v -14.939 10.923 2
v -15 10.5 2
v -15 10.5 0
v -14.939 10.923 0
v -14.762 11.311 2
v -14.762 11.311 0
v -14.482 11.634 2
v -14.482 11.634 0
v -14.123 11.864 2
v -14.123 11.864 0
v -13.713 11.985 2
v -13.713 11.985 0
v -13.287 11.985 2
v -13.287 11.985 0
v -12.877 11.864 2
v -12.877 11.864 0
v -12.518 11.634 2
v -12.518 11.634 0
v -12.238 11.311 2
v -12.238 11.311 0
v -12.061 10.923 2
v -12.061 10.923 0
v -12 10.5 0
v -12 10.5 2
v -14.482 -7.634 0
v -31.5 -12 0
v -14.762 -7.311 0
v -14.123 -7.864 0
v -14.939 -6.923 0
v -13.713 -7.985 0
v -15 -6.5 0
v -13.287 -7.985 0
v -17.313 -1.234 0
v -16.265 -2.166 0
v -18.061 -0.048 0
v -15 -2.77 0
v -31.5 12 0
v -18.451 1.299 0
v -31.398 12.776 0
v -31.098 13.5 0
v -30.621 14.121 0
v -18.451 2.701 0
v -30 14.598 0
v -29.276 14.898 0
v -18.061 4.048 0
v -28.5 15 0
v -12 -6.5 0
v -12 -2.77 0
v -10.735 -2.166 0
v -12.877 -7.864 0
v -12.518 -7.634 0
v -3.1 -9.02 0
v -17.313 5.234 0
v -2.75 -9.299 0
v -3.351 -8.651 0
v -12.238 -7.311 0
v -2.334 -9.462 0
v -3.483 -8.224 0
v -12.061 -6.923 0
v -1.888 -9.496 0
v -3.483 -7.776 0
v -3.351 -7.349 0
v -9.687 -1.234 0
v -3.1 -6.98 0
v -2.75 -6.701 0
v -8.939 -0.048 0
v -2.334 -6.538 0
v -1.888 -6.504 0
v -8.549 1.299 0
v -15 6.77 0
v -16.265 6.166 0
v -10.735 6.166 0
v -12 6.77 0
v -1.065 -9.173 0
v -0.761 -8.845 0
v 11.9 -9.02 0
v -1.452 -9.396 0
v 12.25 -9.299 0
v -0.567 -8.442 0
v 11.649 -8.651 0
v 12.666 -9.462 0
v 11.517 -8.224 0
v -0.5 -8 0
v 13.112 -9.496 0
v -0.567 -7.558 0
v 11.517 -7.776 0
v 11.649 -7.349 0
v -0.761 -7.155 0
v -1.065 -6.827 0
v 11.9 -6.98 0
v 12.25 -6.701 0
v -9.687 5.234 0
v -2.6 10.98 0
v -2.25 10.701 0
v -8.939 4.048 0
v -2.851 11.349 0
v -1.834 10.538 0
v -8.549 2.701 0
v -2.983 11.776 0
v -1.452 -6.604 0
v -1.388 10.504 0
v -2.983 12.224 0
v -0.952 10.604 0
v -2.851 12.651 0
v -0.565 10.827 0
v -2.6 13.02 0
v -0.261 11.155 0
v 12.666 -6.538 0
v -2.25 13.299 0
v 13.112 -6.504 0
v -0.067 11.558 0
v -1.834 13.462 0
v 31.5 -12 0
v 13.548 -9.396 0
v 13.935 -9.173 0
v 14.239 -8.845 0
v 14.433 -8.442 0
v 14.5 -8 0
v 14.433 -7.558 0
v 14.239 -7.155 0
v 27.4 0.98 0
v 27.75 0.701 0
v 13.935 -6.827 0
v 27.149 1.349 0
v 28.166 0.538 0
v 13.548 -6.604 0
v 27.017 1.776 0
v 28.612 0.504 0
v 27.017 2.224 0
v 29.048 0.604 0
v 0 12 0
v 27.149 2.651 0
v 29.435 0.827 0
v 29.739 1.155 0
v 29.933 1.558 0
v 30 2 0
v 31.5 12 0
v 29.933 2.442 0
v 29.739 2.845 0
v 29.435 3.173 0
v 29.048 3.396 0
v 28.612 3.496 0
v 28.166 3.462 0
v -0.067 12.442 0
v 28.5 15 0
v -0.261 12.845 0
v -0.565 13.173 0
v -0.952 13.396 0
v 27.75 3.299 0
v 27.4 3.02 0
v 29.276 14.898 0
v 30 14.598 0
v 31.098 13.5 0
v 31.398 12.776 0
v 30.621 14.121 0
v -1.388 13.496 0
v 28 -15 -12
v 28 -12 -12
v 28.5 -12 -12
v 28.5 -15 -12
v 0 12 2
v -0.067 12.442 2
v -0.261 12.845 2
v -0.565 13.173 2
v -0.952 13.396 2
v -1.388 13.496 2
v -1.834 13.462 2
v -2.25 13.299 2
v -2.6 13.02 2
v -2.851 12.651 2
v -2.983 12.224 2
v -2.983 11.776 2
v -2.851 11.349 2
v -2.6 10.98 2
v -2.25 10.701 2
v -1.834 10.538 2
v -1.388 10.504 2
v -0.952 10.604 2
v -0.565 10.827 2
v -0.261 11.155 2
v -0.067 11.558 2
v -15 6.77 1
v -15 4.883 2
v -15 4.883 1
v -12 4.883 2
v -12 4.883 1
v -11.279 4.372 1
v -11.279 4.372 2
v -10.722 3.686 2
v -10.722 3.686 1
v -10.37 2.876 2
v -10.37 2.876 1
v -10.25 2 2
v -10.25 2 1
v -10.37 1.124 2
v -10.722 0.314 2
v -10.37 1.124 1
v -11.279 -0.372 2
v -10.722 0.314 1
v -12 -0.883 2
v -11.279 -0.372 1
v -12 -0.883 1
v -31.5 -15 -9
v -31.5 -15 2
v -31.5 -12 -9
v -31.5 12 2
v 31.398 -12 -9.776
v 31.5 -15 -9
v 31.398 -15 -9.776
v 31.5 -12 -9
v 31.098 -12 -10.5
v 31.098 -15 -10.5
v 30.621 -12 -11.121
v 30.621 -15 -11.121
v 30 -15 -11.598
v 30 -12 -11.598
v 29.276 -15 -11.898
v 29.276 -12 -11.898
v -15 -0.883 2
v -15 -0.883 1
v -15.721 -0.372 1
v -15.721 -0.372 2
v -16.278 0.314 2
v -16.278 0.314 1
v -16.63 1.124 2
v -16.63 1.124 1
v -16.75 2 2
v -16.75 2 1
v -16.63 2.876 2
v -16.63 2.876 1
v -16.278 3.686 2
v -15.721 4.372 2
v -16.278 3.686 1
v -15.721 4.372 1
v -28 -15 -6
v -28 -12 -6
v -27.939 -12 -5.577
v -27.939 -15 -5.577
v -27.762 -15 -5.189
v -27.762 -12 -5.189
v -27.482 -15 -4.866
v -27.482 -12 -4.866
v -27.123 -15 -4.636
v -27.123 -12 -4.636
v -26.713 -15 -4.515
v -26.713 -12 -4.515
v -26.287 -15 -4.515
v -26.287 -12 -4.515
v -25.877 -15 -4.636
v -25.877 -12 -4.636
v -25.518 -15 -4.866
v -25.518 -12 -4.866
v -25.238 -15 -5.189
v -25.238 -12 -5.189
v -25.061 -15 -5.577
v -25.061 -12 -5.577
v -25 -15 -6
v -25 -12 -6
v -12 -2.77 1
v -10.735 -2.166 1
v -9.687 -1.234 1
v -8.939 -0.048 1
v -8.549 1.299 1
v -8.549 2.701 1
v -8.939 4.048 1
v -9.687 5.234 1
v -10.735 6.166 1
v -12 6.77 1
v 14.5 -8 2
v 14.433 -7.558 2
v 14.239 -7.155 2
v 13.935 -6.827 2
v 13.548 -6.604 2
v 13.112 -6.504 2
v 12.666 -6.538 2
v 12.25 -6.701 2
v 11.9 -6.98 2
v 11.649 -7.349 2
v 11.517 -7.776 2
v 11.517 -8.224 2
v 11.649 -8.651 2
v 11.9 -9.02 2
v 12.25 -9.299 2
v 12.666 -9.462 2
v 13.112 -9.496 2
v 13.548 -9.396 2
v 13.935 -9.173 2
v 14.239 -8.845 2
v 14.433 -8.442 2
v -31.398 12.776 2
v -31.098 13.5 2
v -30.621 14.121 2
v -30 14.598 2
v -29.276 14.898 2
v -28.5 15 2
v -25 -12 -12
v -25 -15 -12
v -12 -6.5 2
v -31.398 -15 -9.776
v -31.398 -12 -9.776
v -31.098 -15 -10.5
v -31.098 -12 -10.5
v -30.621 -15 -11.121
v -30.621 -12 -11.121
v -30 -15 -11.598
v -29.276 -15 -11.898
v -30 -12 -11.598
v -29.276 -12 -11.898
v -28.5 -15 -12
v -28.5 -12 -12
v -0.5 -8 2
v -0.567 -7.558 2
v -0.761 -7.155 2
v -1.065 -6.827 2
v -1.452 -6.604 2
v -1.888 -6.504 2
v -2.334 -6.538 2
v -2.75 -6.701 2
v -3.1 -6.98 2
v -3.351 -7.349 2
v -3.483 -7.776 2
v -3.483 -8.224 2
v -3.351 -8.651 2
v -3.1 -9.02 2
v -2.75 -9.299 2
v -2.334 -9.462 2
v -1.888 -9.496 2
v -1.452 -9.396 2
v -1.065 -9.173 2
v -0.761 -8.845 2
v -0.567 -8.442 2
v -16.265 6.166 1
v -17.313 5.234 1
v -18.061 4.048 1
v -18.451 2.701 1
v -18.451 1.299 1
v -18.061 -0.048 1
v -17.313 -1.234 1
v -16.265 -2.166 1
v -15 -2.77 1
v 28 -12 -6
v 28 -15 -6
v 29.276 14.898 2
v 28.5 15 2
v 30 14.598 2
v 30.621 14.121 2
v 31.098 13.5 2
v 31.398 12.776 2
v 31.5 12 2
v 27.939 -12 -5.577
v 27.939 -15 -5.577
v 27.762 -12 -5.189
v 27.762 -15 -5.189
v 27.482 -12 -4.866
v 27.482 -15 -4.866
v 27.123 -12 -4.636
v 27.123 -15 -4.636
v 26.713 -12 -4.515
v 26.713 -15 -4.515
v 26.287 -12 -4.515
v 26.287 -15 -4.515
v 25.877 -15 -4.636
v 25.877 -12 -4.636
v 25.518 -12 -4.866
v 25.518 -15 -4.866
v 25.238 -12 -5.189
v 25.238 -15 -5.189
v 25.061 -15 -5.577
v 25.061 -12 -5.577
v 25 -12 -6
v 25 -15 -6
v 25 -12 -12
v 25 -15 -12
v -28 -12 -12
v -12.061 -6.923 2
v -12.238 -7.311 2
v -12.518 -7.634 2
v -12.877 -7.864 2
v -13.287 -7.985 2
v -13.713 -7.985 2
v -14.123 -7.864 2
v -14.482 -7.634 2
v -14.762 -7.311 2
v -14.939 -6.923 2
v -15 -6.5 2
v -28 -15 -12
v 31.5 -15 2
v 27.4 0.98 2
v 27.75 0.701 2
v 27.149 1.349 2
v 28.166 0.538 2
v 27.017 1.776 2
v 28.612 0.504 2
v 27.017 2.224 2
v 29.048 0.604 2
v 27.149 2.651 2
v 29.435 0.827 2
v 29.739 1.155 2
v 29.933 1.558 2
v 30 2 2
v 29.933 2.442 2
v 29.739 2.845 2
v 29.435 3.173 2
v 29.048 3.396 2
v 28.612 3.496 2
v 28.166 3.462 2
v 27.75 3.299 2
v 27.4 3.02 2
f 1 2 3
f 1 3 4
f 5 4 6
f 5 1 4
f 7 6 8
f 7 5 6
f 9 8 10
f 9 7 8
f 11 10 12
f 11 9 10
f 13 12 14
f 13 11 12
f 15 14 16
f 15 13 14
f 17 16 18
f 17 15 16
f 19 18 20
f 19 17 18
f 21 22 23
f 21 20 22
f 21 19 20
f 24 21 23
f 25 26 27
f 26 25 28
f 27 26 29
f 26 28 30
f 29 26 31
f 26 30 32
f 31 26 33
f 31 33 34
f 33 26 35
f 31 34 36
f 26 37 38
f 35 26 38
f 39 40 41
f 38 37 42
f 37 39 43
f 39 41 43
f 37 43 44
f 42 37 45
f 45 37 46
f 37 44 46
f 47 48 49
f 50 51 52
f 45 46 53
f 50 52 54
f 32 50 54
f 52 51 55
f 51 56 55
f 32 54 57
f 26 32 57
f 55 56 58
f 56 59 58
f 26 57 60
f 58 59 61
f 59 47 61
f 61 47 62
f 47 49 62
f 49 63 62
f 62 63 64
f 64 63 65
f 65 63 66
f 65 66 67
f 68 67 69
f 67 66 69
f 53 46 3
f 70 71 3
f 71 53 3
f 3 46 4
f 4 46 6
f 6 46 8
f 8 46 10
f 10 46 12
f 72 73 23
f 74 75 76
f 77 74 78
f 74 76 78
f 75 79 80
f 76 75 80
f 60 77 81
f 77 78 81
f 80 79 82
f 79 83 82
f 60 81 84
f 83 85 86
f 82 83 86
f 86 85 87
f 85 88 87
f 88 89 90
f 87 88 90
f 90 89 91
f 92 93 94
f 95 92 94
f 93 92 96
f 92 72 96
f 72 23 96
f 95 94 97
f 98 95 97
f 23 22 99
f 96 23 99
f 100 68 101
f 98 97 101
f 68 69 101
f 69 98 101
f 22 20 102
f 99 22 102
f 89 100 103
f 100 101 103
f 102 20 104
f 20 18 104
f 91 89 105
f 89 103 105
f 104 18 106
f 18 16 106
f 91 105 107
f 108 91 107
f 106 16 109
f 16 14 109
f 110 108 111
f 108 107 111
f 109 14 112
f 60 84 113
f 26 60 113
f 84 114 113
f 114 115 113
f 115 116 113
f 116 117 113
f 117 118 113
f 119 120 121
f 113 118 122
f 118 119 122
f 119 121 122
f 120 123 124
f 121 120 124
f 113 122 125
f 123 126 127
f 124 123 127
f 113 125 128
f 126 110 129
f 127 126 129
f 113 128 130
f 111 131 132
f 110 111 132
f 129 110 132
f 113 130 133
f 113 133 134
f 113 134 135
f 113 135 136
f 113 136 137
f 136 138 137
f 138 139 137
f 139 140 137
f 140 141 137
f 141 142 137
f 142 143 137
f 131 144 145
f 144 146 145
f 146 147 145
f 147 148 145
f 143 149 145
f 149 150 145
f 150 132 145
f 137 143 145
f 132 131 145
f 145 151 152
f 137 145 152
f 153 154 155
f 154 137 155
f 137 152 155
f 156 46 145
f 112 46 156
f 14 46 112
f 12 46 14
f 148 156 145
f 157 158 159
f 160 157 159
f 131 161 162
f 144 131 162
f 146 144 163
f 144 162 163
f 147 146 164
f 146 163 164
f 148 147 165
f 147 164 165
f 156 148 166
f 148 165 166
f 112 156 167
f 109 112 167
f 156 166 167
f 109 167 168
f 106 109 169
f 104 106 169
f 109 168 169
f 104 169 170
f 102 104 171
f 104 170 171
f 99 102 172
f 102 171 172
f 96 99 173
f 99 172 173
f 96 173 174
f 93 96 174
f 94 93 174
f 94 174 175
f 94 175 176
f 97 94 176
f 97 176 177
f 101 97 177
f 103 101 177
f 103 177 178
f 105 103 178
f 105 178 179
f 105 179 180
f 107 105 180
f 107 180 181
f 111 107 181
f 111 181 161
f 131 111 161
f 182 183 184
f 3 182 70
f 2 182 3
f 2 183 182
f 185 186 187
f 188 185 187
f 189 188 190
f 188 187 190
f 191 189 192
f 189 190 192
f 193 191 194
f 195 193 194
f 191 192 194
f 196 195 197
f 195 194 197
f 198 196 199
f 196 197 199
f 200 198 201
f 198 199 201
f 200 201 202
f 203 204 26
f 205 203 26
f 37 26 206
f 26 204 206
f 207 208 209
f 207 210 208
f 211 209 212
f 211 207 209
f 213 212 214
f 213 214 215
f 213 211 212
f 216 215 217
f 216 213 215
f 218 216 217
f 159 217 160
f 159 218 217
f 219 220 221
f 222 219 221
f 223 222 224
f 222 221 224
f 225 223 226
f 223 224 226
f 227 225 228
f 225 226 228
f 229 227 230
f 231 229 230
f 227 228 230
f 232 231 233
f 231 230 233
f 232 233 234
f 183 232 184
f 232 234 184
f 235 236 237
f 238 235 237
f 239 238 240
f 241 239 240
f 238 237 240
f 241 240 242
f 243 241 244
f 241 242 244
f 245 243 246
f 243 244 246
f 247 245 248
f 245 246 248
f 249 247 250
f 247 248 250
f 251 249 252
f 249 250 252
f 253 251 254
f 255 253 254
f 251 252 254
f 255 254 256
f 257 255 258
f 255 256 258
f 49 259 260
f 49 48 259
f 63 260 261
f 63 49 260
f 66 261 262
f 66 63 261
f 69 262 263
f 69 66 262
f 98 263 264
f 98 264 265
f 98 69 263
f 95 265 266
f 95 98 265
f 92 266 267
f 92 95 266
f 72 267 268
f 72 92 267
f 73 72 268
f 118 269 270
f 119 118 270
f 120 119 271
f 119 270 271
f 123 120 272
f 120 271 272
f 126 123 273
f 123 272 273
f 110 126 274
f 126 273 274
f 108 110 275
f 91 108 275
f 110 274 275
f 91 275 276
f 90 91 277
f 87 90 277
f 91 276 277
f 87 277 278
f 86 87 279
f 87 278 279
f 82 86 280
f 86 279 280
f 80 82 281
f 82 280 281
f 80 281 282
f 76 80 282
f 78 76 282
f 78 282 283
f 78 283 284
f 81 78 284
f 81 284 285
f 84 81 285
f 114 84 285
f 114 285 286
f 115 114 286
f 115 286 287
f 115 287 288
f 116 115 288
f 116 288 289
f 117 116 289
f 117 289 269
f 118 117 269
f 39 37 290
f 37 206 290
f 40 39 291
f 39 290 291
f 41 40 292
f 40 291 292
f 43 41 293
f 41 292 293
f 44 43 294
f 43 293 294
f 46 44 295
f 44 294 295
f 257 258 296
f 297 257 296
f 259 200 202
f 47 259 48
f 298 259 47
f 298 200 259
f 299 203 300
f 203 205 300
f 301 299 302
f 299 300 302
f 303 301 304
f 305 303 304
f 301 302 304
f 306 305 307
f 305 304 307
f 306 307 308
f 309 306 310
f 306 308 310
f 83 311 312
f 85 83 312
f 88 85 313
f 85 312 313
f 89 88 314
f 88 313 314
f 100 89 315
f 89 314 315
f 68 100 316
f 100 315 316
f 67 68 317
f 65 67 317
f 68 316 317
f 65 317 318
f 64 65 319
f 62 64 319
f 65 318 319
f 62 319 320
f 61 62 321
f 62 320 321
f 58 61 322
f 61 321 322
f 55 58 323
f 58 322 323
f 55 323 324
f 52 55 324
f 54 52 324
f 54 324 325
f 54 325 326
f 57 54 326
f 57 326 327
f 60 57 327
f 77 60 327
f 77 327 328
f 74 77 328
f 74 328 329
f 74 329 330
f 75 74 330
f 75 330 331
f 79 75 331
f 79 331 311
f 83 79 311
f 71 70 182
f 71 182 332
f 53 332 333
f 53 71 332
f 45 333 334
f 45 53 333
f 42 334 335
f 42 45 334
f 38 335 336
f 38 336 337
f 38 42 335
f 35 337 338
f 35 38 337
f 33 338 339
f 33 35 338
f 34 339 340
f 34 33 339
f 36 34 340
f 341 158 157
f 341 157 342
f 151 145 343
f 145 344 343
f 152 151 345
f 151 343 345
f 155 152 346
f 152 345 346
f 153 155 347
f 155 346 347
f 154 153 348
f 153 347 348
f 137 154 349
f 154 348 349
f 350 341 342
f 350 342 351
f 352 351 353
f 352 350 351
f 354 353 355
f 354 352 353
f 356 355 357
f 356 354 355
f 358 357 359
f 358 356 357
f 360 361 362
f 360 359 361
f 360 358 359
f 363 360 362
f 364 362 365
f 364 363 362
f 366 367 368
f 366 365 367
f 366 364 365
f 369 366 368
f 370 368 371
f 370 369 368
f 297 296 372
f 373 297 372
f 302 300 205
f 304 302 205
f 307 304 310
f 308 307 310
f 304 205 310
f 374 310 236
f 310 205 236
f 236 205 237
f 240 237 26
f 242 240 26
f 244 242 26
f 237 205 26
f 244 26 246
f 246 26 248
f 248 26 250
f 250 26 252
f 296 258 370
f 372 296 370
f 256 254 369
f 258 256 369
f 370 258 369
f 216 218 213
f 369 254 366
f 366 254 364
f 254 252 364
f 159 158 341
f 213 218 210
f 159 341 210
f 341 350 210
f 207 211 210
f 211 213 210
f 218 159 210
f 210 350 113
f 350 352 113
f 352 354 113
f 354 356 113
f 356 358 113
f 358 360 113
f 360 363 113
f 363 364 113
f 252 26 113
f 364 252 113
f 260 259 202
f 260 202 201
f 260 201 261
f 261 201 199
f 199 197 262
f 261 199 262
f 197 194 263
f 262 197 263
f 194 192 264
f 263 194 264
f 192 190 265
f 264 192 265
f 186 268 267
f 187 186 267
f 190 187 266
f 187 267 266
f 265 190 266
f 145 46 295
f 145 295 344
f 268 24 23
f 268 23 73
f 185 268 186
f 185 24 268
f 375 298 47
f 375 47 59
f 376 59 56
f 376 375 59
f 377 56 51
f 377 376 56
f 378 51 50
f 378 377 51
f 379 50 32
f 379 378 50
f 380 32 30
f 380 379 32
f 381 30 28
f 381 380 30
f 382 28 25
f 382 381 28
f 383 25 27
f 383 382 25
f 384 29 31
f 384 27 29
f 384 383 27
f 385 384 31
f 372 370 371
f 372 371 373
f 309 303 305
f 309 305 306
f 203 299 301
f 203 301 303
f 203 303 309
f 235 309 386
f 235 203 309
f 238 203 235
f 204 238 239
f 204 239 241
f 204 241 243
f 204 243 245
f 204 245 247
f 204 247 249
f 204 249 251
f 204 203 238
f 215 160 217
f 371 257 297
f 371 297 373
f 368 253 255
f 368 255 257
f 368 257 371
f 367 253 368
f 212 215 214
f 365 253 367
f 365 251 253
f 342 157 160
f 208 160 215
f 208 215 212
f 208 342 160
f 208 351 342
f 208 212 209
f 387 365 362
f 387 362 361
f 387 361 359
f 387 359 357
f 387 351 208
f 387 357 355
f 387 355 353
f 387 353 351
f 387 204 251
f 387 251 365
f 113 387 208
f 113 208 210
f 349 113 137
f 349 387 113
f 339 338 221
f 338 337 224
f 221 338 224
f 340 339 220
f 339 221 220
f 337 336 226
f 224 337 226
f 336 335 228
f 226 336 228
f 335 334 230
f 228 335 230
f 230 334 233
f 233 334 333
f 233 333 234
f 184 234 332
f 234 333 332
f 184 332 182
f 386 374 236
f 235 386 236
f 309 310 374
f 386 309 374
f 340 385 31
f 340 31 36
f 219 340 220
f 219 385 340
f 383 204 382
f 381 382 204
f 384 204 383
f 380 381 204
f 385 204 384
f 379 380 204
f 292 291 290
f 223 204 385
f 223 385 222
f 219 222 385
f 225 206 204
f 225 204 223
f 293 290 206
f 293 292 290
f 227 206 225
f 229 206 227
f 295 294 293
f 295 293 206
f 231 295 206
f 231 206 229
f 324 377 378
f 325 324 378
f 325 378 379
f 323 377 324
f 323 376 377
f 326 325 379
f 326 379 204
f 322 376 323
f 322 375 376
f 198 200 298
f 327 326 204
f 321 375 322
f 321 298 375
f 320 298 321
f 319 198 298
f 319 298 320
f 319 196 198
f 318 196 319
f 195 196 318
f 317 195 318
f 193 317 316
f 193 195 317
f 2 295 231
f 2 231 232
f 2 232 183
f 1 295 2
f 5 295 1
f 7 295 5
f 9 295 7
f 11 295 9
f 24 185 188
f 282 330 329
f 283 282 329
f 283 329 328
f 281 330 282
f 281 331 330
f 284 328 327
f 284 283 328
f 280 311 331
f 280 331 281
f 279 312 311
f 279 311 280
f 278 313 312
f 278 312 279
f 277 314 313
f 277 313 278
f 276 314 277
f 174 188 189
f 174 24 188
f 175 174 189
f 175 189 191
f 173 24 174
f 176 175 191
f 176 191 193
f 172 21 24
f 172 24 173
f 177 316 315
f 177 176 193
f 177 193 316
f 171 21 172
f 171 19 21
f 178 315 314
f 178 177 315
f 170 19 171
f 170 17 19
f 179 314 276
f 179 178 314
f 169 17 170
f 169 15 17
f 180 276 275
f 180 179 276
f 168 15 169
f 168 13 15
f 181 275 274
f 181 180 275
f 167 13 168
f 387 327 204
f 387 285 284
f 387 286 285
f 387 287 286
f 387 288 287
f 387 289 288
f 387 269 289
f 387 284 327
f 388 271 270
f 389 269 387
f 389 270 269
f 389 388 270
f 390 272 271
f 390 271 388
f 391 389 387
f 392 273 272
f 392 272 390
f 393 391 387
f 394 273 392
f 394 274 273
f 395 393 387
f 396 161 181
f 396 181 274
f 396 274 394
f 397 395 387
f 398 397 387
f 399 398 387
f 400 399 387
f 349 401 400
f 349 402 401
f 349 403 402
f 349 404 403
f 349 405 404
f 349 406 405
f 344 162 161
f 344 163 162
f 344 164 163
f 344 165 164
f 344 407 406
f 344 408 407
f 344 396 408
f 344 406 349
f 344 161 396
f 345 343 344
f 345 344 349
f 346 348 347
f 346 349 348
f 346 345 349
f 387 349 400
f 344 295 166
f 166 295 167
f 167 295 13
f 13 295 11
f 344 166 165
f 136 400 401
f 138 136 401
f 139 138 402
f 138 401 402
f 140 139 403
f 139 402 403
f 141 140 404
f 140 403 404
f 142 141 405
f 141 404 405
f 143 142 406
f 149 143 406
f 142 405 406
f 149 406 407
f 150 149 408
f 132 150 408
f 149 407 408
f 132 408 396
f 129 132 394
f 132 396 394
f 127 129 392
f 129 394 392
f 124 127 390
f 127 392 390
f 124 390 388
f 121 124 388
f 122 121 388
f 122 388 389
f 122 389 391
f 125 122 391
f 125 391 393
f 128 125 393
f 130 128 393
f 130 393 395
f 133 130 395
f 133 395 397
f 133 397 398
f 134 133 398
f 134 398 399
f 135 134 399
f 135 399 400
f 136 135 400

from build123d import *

# Parameters (mm, degrees)
SKETCH1_W           = 63
SKETCH1_H           = 30
BOSS_EXTRUDE1_DEPTH = 2
SKETCH2_W           = 63
SKETCH2_H           = 3
BOSS_EXTRUDE2_DEPTH = 12
CUT_EXTRUDE1_DEPTH  = 44.188540147
FILLET1_R           = 3
CUT_EXTRUDE2_DEPTH  = 38.593217473
SKETCH5_R           = 5
CUT_EXTRUDE3_DEPTH  = 1
SKETCH6_R           = 3.25
CUT_EXTRUDE4_DEPTH  = 38.232378382
SKETCH7_R           = 1.5
CUT_EXTRUDE5_DEPTH  = 38.593217473


with BuildPart() as part:
    # Sketch1 → Boss-Extrude1 (new body)
    with BuildSketch(Plane.XY):
        Rectangle(SKETCH1_W, SKETCH1_H)
    extrude(amount=BOSS_EXTRUDE1_DEPTH)

    # Sketch2 → Boss-Extrude2 (add)
    with BuildSketch(Plane.XY):
        with Locations((0, -13.5)):
            Rectangle(SKETCH2_W, SKETCH2_H)
    extrude(amount=-BOSS_EXTRUDE2_DEPTH)

    # Sketch3 → Cut-Extrude1 (cut, through all)
    with BuildSketch(Plane(origin=(0, -12, 0), x_dir=(1, 0, 0), z_dir=(0, 1, 0))):
        with BuildLine():
            Line((25, 6), (25, 18))
            ThreePointArc((25, 18), (26.5, 19.5), (28, 18))
            Line((28, 18), (28, 6))
            ThreePointArc((28, 6), (26.5, 4.5), (25, 6))
        make_face()
        with BuildLine():
            Line((-25, 6), (-25, 18))
            ThreePointArc((-25, 18), (-26.5, 19.5), (-28, 18))
            Line((-28, 18), (-28, 6))
            ThreePointArc((-28, 6), (-26.5, 4.5), (-25, 6))
        make_face()
    extrude(amount=-CUT_EXTRUDE1_DEPTH, mode=Mode.SUBTRACT)

    # Fillet1
    fillet1_edges = [part.edges().sort_by_distance(p)[0] for p in [
        (-31.5, -13.5, -12),
        (31.5, -13.5, -12),
        (-31.5, 15, 1),
        (31.5, 15, 1),
    ]]
    fillet(fillet1_edges, radius=FILLET1_R)

    # Sketch4 → Cut-Extrude2 (cut, through all)
    with BuildSketch(Plane.XY.offset(2)):
        with BuildLine():
            Line((-12, 10.5), (-12, -6.5))
            ThreePointArc((-12, -6.5), (-13.5, -8), (-15, -6.5))
            Line((-15, -6.5), (-15, 10.5))
            ThreePointArc((-15, 10.5), (-13.5, 12), (-12, 10.5))
        make_face()
    extrude(amount=-CUT_EXTRUDE2_DEPTH, mode=Mode.SUBTRACT)

    # Sketch5 → Cut-Extrude3 (cut)
    with BuildSketch(Plane.XY):
        with Locations((-13.5, 2)):
            Circle(SKETCH5_R)
    extrude(amount=CUT_EXTRUDE3_DEPTH, mode=Mode.SUBTRACT)

    # Sketch6 → Cut-Extrude4 (cut, through all)
    with BuildSketch(Plane(origin=(0, 0, 1), x_dir=(-1, 0, 0), z_dir=(0, 0, -1))):
        with Locations((13.5, 2)):
            Circle(SKETCH6_R)
    extrude(amount=-CUT_EXTRUDE4_DEPTH, mode=Mode.SUBTRACT)

    # Sketch7 → Cut-Extrude5 (cut, through all)
    with BuildSketch(Plane.XY.offset(2)):
        with Locations((28.5, 2)):
            Circle(SKETCH7_R)
        with Locations((-1.5, 12)):
            Circle(SKETCH7_R)
        with Locations((-2, -8)):
            Circle(SKETCH7_R)
        with Locations((13, -8)):
            Circle(SKETCH7_R)
    extrude(amount=-CUT_EXTRUDE5_DEPTH, mode=Mode.SUBTRACT)


solid = part.part
